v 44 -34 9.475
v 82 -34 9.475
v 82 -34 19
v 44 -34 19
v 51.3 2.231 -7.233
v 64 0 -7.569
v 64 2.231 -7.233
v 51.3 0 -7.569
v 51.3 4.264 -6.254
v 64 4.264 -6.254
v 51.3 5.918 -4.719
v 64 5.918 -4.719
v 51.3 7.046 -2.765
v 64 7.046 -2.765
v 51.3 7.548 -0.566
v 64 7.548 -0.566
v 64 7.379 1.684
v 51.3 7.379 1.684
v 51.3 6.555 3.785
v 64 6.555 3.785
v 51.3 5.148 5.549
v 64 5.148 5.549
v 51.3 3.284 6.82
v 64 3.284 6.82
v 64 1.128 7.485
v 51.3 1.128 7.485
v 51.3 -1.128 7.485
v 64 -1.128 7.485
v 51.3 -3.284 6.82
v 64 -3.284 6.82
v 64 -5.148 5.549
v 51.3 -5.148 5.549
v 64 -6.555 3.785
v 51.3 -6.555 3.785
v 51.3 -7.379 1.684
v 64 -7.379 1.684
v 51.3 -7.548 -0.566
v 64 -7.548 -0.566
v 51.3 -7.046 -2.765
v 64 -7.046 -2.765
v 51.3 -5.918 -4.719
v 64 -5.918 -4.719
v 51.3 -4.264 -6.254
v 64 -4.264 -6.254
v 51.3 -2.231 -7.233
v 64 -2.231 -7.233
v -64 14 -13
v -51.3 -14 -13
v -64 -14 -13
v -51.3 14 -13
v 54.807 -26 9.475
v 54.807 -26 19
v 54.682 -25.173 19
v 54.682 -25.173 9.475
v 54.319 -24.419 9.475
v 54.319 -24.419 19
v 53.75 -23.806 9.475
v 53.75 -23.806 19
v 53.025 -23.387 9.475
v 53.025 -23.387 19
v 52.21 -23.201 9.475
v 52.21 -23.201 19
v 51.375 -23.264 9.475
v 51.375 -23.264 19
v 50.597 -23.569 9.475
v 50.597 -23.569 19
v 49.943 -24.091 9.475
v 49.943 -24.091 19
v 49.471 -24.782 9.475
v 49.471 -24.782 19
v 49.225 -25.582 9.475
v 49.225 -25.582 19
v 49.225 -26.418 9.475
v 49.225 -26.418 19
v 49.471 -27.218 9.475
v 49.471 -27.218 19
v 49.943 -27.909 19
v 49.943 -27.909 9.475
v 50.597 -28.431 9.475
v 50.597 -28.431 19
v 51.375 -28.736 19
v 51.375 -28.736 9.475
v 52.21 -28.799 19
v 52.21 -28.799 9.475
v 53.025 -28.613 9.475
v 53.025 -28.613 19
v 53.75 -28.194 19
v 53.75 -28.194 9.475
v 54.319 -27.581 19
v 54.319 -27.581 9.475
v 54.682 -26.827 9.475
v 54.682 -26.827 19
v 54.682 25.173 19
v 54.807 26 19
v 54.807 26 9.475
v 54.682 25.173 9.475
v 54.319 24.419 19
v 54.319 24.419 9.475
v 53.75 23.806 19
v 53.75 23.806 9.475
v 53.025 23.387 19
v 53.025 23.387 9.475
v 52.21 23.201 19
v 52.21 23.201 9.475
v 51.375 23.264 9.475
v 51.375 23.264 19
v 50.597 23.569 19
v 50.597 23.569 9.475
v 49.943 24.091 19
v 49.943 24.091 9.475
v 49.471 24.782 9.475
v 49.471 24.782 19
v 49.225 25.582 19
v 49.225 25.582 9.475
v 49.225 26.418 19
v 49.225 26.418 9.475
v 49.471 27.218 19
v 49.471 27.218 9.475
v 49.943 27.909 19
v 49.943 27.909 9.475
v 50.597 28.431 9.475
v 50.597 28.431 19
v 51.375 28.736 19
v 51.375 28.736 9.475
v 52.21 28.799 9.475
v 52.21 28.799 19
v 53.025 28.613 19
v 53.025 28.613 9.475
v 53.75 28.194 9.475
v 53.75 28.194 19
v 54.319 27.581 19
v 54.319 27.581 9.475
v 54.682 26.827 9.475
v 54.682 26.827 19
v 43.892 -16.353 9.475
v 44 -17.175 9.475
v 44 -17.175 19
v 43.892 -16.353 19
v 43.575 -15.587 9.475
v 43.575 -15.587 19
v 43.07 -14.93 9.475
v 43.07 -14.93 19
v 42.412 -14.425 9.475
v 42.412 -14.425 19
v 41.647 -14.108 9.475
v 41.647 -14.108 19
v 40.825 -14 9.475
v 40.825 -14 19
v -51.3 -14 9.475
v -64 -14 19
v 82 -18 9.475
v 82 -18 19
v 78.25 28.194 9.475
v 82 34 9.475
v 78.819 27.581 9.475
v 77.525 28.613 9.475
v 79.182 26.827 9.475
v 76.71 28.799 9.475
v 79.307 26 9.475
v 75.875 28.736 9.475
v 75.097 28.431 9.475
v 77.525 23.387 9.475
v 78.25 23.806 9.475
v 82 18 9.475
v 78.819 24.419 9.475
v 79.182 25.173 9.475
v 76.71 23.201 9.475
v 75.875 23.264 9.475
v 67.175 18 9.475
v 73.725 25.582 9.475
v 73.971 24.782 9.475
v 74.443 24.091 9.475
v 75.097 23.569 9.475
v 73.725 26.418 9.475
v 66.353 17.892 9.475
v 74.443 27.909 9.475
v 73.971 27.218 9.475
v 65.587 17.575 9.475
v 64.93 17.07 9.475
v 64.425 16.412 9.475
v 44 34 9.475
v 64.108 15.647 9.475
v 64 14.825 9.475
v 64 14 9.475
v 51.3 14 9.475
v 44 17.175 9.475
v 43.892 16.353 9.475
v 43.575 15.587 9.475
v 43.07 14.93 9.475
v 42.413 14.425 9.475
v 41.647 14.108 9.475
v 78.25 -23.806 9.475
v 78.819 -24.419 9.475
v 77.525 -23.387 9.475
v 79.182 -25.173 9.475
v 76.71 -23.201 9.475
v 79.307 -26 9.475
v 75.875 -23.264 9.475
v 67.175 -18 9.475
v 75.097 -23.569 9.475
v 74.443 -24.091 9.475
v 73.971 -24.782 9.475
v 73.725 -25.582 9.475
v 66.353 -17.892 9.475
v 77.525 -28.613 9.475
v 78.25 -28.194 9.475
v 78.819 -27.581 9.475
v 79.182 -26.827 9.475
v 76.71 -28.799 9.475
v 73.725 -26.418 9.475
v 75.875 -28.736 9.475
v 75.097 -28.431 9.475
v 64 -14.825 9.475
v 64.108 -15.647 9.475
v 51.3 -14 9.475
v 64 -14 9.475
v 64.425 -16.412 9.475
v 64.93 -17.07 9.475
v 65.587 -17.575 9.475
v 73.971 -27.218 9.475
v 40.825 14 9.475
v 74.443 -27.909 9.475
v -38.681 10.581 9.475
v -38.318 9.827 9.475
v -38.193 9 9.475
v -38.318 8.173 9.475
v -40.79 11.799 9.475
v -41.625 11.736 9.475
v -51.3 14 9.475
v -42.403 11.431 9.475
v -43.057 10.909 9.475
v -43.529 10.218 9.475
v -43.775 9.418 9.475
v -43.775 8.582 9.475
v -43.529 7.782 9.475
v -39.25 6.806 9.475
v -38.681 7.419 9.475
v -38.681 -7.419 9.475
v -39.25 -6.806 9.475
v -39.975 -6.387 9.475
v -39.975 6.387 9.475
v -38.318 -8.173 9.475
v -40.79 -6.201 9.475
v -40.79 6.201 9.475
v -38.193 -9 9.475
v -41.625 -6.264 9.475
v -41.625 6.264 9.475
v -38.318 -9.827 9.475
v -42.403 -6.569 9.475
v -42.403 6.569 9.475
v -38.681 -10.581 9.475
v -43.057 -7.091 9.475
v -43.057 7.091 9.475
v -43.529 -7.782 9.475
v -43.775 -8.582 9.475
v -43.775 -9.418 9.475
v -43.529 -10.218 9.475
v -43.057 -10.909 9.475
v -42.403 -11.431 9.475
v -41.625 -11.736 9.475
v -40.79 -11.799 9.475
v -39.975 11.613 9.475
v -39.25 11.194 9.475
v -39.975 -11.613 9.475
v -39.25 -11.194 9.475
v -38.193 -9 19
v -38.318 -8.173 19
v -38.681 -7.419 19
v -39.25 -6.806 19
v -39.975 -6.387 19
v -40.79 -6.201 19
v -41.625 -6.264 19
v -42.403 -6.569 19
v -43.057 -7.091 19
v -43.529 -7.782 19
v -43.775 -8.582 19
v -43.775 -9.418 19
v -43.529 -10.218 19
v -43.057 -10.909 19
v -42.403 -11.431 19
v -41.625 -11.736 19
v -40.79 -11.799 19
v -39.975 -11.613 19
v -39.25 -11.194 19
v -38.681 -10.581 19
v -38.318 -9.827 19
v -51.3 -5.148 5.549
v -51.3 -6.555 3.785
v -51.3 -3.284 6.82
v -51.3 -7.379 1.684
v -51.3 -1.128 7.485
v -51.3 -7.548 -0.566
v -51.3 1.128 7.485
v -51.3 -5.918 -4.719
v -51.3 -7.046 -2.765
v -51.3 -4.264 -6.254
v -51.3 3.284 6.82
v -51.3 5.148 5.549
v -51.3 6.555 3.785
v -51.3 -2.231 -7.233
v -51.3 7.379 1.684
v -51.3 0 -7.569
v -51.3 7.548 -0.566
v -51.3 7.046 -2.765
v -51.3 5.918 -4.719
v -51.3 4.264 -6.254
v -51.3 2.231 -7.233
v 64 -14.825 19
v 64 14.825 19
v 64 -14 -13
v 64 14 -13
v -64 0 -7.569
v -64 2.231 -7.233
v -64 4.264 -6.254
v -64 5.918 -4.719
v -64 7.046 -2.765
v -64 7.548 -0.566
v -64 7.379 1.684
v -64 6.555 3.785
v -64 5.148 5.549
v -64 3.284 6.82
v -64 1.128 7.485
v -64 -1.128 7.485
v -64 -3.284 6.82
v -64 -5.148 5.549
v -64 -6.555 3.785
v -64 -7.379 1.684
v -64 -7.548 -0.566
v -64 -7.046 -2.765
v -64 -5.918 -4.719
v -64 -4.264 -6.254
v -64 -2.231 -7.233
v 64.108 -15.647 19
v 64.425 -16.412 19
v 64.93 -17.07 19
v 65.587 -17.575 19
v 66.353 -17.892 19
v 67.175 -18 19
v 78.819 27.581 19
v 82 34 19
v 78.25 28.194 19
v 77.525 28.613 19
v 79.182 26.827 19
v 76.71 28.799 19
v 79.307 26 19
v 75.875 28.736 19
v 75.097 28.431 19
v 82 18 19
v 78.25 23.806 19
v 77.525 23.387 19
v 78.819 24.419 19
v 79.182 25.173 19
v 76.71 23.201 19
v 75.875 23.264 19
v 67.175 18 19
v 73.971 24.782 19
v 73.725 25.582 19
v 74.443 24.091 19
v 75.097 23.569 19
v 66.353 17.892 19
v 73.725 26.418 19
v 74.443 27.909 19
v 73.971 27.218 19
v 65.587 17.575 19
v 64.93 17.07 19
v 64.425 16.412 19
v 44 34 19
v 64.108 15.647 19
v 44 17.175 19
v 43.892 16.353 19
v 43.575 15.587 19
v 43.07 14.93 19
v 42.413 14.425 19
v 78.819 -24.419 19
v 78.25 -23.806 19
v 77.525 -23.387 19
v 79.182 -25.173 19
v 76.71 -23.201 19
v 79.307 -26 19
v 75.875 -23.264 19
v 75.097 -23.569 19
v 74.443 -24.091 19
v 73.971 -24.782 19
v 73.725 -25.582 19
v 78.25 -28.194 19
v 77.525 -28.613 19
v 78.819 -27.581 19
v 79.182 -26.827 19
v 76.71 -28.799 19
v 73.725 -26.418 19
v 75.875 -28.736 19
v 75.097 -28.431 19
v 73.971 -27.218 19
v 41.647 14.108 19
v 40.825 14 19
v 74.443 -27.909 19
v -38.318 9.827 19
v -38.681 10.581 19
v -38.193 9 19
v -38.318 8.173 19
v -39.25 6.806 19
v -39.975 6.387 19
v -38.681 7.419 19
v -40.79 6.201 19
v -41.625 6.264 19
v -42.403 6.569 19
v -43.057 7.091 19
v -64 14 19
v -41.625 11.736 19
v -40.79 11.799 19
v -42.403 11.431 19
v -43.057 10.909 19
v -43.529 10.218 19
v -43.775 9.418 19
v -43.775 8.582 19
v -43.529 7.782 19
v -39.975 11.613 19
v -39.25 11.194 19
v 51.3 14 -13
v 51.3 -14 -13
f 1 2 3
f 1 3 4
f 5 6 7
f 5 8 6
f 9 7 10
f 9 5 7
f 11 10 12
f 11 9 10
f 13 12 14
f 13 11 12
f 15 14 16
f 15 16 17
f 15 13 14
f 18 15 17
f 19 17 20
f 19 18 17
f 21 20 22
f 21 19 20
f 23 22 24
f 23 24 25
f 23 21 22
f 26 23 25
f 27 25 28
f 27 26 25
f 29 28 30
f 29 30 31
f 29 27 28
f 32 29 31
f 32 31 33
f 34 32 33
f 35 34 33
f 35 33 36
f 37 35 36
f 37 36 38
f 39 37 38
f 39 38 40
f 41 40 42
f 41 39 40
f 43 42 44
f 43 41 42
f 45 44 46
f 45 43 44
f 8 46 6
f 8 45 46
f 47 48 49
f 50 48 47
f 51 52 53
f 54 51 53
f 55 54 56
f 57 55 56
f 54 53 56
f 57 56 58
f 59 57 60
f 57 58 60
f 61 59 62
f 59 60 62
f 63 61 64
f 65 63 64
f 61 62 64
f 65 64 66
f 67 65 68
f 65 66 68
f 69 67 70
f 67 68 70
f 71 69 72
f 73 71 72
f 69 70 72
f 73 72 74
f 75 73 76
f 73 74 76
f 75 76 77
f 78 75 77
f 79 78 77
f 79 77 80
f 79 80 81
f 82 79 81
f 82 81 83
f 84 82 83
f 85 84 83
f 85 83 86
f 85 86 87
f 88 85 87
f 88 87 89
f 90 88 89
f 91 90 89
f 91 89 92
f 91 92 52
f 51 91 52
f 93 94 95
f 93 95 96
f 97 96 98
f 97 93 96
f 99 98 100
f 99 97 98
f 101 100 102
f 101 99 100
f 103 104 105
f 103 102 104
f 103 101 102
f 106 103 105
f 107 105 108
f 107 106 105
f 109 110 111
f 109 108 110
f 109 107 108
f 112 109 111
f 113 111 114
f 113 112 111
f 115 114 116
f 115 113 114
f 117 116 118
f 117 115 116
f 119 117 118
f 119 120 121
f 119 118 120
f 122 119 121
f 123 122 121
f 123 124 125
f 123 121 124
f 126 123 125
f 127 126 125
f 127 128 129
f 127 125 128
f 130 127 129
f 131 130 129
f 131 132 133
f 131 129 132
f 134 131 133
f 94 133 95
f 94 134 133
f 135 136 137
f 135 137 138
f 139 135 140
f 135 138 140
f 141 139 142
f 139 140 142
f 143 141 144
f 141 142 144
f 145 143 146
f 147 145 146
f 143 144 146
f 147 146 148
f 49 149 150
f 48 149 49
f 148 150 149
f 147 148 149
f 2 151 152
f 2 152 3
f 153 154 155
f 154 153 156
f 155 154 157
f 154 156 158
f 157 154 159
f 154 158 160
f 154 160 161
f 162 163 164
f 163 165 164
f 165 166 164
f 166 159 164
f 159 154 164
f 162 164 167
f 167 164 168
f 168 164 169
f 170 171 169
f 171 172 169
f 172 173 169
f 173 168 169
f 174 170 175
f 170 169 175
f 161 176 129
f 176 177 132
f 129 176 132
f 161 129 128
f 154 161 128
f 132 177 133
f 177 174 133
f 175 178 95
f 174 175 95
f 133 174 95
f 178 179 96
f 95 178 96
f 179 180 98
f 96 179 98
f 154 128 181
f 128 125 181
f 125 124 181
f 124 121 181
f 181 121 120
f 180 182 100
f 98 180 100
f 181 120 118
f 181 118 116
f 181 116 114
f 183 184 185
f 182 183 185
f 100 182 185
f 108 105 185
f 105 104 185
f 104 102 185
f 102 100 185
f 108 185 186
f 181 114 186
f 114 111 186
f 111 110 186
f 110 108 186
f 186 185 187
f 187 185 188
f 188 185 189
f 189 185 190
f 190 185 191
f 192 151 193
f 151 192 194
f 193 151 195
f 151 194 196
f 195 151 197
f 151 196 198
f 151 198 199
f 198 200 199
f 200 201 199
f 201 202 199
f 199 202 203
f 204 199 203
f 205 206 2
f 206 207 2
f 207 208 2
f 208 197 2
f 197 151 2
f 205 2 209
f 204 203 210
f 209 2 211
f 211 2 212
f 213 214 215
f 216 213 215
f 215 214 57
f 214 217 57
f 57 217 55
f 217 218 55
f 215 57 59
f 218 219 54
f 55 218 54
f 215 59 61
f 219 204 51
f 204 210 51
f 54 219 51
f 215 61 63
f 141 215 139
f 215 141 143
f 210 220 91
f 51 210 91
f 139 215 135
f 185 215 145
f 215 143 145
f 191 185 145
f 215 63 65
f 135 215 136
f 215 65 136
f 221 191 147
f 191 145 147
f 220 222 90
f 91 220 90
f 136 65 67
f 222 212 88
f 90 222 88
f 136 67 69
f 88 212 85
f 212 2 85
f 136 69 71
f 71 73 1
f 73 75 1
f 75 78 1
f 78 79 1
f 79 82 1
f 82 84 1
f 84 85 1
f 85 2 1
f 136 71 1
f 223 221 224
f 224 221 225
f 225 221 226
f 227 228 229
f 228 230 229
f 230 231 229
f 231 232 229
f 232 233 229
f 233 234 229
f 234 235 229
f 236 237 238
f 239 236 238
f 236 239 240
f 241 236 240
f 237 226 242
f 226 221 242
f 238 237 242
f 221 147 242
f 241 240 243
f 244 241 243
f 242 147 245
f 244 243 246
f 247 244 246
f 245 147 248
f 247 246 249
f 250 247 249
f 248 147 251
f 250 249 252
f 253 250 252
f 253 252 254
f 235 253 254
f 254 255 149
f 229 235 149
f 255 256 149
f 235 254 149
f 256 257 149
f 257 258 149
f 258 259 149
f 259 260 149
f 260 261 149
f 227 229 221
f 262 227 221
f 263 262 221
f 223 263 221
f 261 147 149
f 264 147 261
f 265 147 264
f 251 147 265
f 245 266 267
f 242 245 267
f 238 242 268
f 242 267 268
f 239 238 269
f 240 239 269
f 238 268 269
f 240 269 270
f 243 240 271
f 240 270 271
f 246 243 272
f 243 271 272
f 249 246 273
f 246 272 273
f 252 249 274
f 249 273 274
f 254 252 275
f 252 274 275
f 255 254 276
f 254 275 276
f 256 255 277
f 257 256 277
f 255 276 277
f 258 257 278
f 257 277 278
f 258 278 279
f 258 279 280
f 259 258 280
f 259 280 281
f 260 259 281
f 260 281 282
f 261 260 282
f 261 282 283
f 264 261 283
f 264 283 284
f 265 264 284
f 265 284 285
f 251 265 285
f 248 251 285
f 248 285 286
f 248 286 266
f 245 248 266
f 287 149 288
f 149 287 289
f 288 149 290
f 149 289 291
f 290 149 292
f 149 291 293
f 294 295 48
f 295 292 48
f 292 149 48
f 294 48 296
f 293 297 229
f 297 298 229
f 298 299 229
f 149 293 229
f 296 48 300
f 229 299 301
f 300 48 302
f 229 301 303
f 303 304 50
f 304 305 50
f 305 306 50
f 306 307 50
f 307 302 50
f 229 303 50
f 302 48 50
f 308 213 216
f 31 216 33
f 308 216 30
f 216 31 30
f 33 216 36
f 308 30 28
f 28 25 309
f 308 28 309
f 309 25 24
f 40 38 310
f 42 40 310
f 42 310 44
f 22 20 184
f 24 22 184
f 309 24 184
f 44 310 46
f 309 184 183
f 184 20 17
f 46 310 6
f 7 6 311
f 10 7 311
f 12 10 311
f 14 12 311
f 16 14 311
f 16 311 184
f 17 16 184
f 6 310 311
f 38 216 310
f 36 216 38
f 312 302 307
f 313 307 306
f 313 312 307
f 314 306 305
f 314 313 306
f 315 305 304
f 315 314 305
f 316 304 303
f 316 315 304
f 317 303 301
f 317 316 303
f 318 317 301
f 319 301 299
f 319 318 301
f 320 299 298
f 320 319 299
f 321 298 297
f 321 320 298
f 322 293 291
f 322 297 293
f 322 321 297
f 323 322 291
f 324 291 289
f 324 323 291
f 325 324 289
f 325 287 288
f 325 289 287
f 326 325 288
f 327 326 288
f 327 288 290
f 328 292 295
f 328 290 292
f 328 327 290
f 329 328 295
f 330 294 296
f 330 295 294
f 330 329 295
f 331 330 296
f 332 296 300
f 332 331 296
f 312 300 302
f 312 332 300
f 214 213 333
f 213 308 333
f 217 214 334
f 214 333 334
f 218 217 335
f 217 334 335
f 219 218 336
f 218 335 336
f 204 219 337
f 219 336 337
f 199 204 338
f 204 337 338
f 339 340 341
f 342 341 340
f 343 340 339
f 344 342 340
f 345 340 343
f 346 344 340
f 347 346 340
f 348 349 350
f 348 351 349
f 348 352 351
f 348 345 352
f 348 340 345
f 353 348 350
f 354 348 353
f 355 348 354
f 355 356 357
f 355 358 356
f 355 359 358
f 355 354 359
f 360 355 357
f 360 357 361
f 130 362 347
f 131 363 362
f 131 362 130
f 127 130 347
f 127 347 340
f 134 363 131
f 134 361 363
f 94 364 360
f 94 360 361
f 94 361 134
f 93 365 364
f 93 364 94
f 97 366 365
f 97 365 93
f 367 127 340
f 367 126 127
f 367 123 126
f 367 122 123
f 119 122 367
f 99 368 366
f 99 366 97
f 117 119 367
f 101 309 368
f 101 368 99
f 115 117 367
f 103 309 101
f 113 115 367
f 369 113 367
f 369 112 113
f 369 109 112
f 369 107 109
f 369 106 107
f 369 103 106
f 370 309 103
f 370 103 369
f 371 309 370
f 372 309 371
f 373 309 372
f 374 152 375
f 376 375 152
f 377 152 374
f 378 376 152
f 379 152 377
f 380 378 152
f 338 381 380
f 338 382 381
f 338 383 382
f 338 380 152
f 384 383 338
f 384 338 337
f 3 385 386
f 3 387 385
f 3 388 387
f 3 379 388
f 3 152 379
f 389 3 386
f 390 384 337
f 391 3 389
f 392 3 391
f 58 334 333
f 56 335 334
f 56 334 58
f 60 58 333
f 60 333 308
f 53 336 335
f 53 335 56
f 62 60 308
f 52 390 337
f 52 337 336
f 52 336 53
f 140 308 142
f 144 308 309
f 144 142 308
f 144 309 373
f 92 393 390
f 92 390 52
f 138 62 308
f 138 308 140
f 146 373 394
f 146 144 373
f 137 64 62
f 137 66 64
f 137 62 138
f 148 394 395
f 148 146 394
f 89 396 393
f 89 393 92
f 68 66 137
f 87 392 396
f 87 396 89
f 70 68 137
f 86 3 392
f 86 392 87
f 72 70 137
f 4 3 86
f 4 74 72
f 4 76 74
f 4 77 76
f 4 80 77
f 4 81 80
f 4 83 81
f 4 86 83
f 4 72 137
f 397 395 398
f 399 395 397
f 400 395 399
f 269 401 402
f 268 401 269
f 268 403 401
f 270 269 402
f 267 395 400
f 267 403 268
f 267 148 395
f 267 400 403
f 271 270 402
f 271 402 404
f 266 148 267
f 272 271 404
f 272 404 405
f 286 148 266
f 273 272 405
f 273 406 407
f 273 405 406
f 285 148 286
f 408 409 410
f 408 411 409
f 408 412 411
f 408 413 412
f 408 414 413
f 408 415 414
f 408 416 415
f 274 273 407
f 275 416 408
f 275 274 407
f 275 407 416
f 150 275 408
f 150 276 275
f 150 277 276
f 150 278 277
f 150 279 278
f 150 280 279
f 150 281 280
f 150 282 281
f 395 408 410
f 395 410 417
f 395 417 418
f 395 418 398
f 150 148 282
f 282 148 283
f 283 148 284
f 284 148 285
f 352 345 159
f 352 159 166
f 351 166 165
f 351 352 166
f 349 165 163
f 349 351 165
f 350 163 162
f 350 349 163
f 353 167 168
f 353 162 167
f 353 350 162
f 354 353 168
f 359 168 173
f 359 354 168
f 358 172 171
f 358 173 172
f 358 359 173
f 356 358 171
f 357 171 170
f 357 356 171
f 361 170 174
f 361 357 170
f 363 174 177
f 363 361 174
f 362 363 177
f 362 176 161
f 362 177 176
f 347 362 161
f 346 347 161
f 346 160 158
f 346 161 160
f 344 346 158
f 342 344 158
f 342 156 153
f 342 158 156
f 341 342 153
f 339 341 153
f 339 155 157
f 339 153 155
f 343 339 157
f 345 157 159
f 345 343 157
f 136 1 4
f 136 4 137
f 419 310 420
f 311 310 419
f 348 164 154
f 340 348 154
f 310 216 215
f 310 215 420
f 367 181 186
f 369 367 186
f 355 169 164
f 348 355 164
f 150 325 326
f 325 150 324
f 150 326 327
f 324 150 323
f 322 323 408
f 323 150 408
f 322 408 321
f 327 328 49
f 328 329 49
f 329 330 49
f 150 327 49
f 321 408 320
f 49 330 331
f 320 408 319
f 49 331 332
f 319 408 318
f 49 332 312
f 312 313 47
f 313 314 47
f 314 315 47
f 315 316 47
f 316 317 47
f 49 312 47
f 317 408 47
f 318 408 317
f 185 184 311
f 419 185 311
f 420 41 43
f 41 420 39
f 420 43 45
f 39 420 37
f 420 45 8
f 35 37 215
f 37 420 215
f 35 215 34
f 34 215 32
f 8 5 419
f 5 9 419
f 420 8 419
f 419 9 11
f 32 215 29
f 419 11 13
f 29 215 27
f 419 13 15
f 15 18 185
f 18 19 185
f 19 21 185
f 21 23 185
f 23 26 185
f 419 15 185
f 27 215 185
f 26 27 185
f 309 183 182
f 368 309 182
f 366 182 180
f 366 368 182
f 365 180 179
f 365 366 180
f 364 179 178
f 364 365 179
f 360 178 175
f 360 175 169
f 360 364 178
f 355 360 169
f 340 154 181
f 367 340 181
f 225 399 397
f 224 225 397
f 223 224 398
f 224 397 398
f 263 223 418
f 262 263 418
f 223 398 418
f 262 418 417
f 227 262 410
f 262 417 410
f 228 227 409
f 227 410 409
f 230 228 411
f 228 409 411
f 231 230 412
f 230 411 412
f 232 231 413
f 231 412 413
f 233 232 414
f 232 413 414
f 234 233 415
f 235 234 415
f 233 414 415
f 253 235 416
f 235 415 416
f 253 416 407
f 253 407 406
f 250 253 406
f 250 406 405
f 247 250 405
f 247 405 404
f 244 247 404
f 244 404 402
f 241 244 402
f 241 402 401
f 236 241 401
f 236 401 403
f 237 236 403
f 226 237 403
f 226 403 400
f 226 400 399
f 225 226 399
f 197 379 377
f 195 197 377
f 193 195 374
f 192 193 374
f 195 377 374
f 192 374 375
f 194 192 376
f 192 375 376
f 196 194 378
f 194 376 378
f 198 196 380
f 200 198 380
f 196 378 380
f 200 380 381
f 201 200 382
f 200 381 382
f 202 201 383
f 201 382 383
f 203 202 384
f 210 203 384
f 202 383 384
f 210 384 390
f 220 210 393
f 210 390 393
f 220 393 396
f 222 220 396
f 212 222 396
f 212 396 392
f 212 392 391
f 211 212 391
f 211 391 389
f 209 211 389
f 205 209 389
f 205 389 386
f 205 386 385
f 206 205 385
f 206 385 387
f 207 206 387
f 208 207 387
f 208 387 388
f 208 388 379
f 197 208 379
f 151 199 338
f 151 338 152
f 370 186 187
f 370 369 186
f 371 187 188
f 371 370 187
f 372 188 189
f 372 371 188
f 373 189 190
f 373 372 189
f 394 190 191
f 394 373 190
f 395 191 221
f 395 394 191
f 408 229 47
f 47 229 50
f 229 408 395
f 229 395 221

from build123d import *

# Parameters (mm, degrees)
SKETCH1_W                  = 32
SKETCH1_H                  = 28
SKETCH1_R                  = 7.5692
BOSS_EXTRUDE1_DEPTH        = 64
SKETCH5_W                  = 102.6
SKETCH5_H                  = 28
CUT_EXTRUDE1_DEPTH         = 9.475
CUT_EXTRUDE1_DEPTH_BACK    = 33.147
F_10_CLEARANCE_HOLE1_D     = 5.6134
F_10_CLEARANCE_HOLE1_DEPTH = 25.4
F_10_CLEARANCE_HOLE1_TIP   = 1.686435499
BOSS_EXTRUDE2_DEPTH        = 9.525
F_10_CLEARANCE_HOLE2_D     = 5.6134
FILLET2_R                  = 3.175


with BuildPart() as part:
    # Sketch1 → Boss-Extrude1 (new body, symmetric)
    with BuildSketch(Plane(origin=(0, 0, 0), x_dir=(0, 0, -1), z_dir=(1, 0, 0))):
        with Locations((-3, 0)):
            Rectangle(SKETCH1_W, SKETCH1_H)
        Circle(SKETCH1_R, mode=Mode.SUBTRACT)
    extrude(amount=BOSS_EXTRUDE1_DEPTH, both=True)

    # Sketch5 → Cut-Extrude1 (cut, two sides)
    with BuildSketch(Plane.XY) as cut_extrude1_sk:
        Rectangle(SKETCH5_W, SKETCH5_H)
    extrude(amount=CUT_EXTRUDE1_DEPTH, mode=Mode.SUBTRACT)
    extrude(cut_extrude1_sk.sketch, amount=-CUT_EXTRUDE1_DEPTH_BACK, mode=Mode.SUBTRACT)

    # #10 Clearance Hole1
    with Locations(Plane(origin=(-39.55789498, -3.670822781, 9.475), x_dir=(-1, 0, 0), z_dir=(0, 0, -1))):
        with Locations((1.44210502, -5.329177219), (1.44210502, 12.670822781)):
            Hole(F_10_CLEARANCE_HOLE1_D / 2, depth=F_10_CLEARANCE_HOLE1_DEPTH)
            with Locations((0, 0, -(F_10_CLEARANCE_HOLE1_DEPTH + F_10_CLEARANCE_HOLE1_TIP / 2))):  # 118° drill point
                Cone(0, F_10_CLEARANCE_HOLE1_D / 2, F_10_CLEARANCE_HOLE1_TIP, mode=Mode.SUBTRACT)

    # Sketch7 → Boss-Extrude2 (add)
    with BuildSketch(Plane(origin=(0, 0, 9.475), x_dir=(-1, 0, 0), z_dir=(0, 0, -1))):
        Polygon((-44, -14), (-64, -14), (-64, -18), (-82, -18), (-82, -34), (-44, -34), align=None)
    boss_extrude2 = extrude(amount=-BOSS_EXTRUDE2_DEPTH)

    # #10 Clearance Hole2 (through all)
    with Locations(Plane(origin=(0, 0, 9.475), x_dir=(-1, 0, 0), z_dir=(0, 0, -1))):
        with Locations((-76.5, -26), (-52, -26)):
            f_10_clearance_hole2 = Hole(F_10_CLEARANCE_HOLE2_D / 2)

    # Mirror2: Boss-Extrude2, #10 Clearance Hole2 across plane
    add(boss_extrude2.mirror(Plane.ZX))
    add(f_10_clearance_hole2.mirror(Plane.ZX), mode=Mode.SUBTRACT)

    # Fillet2
    fillet2_edges = [part.edges().sort_by_distance(p)[0] for p in [
        (44, 14, 14.2375),
        (44, -14, 14.2375),
        (64, 18, 14.2375),
        (64, -18, 14.2375),
    ]]
    fillet(fillet2_edges, radius=FILLET2_R)


solid = part.part
